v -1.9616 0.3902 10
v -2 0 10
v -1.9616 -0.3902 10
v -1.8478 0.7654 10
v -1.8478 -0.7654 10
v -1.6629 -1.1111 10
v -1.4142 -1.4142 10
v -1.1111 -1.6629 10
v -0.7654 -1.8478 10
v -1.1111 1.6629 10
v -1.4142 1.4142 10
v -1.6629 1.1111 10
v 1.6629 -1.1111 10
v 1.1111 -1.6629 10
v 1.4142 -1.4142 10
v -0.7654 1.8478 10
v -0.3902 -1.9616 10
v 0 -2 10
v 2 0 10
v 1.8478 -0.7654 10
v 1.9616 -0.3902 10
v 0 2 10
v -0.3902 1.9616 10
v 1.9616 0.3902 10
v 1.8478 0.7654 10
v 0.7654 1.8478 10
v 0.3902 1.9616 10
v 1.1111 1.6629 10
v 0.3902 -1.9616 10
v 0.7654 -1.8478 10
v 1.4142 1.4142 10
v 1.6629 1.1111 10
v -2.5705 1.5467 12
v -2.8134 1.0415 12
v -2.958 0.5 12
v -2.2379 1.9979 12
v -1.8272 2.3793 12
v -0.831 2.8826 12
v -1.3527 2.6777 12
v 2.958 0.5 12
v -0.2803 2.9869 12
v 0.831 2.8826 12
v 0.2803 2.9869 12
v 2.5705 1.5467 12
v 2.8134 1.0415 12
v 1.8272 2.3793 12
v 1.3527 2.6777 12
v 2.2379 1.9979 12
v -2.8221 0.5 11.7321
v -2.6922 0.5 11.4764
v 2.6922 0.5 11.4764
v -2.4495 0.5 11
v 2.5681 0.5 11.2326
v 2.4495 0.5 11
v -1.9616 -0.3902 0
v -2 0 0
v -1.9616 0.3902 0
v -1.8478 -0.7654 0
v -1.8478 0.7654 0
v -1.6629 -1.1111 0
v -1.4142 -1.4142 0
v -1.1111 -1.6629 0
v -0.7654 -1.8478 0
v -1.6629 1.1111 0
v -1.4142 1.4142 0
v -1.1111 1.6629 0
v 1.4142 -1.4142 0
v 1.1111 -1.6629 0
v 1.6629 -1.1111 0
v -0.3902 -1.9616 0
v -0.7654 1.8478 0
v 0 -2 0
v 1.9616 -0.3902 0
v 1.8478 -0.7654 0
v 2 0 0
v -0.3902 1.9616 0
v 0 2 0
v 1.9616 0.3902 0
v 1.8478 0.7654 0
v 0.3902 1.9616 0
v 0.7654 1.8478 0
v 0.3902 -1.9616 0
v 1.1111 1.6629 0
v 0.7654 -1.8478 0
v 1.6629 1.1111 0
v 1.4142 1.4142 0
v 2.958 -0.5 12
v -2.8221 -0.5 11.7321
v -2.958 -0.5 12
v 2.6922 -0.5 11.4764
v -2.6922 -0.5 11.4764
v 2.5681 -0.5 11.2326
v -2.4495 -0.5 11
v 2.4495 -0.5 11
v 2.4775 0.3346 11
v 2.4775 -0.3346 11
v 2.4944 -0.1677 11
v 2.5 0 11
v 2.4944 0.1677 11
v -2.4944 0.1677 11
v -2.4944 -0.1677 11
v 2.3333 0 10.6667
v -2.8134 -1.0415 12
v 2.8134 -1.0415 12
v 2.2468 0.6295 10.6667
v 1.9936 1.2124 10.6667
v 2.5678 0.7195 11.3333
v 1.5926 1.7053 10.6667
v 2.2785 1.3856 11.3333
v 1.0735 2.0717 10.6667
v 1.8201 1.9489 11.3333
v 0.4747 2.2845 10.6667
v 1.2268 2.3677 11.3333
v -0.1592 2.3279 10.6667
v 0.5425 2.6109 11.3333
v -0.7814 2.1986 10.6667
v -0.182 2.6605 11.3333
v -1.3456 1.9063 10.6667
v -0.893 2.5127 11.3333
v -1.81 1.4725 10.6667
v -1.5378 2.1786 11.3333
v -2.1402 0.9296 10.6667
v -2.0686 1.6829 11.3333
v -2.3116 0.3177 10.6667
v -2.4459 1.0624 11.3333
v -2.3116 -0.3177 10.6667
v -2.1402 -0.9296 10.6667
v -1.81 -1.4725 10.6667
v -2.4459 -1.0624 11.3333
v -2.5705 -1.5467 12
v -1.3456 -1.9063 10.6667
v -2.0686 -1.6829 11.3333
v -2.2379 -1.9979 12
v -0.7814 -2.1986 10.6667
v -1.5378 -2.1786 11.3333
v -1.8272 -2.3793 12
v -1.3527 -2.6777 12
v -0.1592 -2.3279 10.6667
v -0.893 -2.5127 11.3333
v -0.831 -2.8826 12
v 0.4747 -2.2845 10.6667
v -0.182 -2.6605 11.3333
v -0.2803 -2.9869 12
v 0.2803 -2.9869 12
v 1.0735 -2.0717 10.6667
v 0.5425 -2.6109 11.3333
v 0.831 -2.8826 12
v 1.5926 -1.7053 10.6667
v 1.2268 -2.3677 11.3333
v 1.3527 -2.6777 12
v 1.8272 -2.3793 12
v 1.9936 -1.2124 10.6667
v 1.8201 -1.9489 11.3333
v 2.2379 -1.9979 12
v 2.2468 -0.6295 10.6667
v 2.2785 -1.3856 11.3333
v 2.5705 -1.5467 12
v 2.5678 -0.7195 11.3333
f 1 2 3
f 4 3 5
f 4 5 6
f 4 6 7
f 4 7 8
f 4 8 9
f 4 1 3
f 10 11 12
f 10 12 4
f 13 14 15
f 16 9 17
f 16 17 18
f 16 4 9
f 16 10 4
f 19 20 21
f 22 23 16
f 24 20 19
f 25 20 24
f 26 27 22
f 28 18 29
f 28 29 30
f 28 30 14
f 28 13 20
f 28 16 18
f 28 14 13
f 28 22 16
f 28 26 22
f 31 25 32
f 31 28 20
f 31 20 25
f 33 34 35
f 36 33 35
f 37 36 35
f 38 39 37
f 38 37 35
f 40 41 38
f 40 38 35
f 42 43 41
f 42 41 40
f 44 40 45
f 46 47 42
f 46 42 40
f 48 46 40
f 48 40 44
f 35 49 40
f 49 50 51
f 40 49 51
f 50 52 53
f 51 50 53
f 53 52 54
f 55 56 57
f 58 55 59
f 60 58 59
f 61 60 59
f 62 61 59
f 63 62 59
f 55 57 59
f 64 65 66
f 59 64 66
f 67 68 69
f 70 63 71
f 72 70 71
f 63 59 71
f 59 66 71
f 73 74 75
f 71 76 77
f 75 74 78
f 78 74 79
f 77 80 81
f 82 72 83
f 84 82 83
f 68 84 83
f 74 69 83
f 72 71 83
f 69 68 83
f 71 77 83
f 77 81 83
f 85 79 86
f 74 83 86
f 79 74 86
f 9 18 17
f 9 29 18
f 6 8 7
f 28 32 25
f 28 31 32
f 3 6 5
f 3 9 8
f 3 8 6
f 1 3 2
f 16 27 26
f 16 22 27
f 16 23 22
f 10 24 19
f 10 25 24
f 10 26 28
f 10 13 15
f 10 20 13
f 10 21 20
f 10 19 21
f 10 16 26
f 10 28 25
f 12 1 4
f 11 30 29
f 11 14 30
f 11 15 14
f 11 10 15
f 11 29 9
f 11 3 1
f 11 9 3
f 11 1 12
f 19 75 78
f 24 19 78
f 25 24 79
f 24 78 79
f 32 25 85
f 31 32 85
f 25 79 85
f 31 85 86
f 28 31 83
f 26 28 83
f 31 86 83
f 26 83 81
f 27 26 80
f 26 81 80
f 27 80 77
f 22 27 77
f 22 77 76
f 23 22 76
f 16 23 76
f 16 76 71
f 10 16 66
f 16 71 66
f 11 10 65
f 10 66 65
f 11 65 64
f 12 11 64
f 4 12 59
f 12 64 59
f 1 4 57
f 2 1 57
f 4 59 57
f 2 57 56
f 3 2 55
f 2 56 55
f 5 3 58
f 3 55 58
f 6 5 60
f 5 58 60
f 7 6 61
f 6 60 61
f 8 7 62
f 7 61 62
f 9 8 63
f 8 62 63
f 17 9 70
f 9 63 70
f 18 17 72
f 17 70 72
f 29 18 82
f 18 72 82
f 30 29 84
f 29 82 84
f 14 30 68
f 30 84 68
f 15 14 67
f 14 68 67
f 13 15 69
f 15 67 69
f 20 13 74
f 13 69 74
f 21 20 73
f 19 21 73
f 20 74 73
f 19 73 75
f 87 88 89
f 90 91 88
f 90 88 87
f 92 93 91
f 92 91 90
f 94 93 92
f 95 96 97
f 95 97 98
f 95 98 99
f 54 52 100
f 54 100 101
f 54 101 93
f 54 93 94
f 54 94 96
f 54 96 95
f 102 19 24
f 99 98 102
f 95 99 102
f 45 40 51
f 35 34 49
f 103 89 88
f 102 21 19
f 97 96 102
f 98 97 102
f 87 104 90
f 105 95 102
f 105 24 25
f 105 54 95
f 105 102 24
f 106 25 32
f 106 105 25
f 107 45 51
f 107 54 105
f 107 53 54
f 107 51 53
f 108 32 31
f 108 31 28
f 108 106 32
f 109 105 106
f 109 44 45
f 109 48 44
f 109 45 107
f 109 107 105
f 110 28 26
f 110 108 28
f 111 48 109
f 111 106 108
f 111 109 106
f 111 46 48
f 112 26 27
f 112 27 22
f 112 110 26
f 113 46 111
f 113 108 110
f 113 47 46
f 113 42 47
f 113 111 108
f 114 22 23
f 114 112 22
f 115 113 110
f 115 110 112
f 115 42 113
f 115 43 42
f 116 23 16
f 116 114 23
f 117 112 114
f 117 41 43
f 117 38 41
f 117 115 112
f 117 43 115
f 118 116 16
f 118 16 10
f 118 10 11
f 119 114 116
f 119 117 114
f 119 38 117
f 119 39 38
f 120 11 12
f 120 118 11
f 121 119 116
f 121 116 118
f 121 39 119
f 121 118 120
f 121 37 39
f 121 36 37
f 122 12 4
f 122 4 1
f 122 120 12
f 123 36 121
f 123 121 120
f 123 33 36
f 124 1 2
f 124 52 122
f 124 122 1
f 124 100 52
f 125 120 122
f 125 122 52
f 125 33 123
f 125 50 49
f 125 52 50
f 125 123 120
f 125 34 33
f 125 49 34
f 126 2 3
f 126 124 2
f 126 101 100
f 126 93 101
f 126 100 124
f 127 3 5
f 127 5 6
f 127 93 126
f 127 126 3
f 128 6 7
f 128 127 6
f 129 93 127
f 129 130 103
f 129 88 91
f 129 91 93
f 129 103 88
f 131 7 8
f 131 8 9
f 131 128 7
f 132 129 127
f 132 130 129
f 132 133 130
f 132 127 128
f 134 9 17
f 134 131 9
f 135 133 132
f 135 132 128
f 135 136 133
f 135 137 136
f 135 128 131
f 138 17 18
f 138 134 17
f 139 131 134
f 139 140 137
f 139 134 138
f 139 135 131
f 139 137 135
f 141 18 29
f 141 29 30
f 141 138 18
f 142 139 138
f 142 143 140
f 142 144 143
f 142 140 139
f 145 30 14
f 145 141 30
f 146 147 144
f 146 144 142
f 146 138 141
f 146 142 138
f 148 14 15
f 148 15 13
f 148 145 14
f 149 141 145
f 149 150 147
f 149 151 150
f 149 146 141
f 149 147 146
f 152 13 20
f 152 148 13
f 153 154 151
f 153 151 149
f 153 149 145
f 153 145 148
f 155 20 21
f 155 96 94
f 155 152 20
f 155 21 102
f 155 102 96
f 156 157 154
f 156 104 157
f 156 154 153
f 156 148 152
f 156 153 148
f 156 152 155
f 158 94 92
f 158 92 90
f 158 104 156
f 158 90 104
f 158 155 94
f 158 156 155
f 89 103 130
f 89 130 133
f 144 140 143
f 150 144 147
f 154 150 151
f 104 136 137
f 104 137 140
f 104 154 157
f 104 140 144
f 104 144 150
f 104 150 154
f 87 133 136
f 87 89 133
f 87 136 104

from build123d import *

# Parameters (mm, degrees)
CYLINDER_R     = 2
CYLINDER_DEPTH = 10
BOX_W          = 6
BOX_H          = 1
BOX_DEPTH      = 1


with BuildPart() as cylinder:
    # Cylinder → Cylinder (new body)
    with BuildSketch(Plane.XY):
        Circle(CYLINDER_R)
    extrude(amount=CYLINDER_DEPTH)


with BuildPart() as cube:
    # Box → Box (new body)
    with BuildSketch(Plane(origin=(-3, -0.5, 11), x_dir=(1, 0, 0), z_dir=(0, 0, 1))):
        with Locations((3, 0.5)):
            Rectangle(BOX_W, BOX_H)
    extrude(amount=BOX_DEPTH)


with BuildPart() as cut:
    # Cone → Cone (revolve)
    with BuildSketch(Plane(origin=(0, 0, 10), x_dir=(1, 0, 0), z_dir=(0, -1, 0))):
        Polygon((0, 0), (2, 0), (3, 2), (0, 2), align=None)
    revolve(axis=Axis((0, 0, 10), (0, 0, 1)))

    # Cut: cut Cube
    add(cube.part, mode=Mode.SUBTRACT)


solid = Compound([cylinder.part, cut.part])
